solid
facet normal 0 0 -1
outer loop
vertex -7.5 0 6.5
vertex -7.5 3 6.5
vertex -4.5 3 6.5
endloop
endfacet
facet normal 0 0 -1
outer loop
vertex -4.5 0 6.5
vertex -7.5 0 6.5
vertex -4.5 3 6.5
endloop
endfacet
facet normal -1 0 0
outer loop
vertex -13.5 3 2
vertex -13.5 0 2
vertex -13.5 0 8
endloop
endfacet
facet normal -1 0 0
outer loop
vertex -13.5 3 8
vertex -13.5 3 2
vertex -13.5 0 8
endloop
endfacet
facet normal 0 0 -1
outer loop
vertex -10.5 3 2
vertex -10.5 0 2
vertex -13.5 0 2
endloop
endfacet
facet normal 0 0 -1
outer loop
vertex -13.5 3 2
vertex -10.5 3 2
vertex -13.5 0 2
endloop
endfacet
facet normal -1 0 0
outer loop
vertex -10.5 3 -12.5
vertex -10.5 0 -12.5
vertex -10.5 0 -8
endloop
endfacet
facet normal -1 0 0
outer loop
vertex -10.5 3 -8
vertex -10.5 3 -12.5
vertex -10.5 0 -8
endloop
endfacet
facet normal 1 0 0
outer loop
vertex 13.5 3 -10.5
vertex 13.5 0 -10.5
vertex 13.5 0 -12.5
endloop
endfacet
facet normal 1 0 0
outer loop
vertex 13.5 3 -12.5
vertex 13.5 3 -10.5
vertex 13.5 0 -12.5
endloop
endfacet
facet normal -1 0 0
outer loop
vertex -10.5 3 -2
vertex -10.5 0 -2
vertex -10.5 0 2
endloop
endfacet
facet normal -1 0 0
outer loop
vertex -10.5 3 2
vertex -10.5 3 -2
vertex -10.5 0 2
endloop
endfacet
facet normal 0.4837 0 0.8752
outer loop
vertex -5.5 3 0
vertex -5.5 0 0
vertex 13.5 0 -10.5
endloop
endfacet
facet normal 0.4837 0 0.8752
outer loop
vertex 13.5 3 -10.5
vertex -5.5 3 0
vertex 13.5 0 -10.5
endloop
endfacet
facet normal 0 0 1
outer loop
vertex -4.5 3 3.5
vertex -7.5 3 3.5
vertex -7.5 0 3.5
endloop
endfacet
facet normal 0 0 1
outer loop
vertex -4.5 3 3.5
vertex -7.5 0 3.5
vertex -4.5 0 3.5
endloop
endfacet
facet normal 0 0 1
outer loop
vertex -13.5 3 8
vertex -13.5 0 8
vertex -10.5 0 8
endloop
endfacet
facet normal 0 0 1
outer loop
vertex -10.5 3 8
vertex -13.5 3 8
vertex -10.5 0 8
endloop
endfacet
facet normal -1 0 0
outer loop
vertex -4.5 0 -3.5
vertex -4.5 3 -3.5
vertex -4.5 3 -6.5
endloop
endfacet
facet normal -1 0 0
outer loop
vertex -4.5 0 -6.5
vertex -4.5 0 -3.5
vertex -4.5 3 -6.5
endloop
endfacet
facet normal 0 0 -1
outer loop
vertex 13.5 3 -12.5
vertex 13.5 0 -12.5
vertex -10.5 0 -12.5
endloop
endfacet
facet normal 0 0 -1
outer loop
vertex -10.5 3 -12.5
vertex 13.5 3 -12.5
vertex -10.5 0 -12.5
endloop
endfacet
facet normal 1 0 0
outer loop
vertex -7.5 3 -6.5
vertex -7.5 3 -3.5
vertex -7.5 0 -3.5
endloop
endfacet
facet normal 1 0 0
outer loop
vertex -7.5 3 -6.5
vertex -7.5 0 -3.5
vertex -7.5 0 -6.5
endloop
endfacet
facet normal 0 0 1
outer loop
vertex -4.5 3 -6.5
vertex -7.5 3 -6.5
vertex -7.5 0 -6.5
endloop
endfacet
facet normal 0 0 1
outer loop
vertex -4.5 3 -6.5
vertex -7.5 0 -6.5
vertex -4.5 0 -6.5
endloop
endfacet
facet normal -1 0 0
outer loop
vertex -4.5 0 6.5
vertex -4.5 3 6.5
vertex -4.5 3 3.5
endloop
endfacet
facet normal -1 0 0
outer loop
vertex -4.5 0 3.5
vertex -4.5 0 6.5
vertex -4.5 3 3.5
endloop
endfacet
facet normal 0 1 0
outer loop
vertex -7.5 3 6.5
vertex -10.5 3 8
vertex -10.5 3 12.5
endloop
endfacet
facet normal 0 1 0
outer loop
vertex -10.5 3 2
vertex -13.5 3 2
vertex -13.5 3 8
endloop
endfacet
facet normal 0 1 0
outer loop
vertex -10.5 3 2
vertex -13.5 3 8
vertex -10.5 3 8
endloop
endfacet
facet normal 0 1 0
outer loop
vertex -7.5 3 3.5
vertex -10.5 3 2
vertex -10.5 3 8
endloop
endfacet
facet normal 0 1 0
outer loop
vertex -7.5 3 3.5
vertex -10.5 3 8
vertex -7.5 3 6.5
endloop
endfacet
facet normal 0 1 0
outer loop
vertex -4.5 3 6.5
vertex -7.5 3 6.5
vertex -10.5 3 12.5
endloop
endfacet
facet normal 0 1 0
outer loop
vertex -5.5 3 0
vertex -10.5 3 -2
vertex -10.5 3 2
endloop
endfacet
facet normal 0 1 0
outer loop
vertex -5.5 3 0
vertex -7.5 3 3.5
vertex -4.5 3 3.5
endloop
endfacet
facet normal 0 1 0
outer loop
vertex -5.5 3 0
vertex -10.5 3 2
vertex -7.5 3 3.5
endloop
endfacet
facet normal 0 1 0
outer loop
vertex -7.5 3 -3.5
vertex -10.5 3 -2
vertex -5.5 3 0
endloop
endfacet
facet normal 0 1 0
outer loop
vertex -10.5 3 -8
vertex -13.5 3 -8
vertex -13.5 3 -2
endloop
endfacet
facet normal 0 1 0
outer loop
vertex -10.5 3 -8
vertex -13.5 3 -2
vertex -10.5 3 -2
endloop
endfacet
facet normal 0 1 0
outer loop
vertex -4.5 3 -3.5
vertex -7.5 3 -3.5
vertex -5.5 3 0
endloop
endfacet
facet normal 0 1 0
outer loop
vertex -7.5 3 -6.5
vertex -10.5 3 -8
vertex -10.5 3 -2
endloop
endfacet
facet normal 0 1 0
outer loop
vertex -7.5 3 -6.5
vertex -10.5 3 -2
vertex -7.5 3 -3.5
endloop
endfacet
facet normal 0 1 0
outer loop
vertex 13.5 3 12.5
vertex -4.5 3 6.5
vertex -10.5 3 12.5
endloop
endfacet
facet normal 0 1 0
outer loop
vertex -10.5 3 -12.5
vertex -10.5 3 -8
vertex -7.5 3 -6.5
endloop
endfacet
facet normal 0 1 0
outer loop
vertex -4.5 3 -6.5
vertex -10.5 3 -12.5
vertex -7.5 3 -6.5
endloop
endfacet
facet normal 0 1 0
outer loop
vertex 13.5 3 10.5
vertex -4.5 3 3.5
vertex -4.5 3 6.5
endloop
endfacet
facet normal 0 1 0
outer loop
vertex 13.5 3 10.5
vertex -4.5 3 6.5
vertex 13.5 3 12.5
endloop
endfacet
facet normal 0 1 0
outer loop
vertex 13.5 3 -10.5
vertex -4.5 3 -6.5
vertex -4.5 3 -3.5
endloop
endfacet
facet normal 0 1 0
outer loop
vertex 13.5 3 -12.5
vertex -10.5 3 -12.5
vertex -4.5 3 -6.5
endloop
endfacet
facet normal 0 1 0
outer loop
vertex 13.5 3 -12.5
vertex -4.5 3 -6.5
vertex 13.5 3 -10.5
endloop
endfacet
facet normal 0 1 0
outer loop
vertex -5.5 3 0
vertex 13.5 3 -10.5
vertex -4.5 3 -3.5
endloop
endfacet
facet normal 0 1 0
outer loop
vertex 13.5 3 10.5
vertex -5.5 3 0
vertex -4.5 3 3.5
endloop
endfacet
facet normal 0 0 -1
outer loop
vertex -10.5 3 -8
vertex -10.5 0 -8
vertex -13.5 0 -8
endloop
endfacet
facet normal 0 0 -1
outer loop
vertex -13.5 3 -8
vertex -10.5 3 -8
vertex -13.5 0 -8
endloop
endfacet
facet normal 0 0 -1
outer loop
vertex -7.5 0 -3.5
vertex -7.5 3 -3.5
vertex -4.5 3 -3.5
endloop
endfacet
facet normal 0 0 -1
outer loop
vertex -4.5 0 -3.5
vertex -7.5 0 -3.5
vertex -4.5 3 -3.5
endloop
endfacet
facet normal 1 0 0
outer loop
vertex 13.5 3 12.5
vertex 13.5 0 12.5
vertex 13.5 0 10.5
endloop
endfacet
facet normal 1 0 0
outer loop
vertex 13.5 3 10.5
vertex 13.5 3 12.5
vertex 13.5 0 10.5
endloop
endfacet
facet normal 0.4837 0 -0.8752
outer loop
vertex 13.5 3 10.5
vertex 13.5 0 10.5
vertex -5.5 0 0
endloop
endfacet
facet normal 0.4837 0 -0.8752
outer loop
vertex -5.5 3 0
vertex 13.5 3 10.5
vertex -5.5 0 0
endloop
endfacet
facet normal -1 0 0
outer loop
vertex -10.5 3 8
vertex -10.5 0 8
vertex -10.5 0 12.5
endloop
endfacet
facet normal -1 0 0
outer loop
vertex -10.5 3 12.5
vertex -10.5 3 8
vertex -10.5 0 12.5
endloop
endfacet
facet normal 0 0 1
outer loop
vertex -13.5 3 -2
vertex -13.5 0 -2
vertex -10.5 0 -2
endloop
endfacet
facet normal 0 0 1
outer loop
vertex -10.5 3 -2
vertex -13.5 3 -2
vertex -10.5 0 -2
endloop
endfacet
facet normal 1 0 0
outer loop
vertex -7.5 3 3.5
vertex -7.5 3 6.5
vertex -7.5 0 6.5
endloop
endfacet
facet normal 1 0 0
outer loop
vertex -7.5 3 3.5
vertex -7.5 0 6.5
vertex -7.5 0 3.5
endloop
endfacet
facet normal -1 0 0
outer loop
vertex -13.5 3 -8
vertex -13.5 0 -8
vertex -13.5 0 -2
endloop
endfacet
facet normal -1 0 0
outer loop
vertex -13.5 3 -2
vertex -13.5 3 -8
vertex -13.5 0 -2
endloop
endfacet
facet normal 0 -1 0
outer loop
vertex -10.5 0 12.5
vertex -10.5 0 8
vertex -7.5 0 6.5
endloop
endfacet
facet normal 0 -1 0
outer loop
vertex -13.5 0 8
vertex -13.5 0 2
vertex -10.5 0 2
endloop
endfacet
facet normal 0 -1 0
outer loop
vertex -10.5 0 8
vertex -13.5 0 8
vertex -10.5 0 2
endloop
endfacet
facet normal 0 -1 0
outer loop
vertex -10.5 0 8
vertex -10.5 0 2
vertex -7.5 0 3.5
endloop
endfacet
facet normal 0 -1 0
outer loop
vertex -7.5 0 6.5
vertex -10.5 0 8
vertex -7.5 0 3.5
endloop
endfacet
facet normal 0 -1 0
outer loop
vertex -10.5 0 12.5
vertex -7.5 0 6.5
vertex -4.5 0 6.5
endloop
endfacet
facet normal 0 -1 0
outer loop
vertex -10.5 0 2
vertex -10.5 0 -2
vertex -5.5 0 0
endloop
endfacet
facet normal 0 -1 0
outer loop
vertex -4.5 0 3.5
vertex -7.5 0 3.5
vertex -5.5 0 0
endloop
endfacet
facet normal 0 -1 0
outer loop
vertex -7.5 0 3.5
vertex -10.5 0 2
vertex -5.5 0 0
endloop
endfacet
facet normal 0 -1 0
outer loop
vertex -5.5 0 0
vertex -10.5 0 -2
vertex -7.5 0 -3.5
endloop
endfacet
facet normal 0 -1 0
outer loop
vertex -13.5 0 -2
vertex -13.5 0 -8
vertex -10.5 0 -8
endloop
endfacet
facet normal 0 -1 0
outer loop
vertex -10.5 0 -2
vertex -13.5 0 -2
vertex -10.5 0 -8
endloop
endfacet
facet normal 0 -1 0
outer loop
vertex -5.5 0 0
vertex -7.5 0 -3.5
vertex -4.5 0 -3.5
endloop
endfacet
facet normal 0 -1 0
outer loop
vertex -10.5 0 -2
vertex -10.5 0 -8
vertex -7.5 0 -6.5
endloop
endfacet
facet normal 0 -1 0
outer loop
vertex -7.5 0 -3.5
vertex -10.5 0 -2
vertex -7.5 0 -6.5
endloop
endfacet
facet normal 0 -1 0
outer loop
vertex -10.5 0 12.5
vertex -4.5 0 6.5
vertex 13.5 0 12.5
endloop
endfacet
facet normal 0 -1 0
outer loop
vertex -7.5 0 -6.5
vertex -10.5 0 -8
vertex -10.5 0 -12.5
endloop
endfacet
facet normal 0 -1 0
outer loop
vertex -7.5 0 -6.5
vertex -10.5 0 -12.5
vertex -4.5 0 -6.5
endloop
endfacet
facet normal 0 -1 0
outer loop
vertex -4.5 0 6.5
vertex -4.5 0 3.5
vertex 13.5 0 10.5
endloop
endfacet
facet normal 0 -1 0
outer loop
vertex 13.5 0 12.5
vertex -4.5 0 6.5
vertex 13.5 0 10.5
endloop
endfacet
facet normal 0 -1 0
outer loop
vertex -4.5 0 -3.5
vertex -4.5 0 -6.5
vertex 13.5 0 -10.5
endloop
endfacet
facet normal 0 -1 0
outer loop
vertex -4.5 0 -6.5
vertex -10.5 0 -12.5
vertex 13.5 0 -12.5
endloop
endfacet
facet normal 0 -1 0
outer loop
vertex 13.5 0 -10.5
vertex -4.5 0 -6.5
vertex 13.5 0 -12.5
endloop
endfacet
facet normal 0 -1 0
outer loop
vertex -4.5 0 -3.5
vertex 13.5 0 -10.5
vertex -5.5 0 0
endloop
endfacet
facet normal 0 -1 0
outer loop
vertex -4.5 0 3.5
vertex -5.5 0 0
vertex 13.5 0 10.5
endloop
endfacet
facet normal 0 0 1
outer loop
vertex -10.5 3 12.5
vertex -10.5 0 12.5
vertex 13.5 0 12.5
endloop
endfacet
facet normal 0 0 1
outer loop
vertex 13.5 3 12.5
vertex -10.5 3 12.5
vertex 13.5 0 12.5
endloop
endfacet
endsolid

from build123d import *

# Parameters (mm, degrees)
BOSS_EXTRUDE1_DEPTH = 3
SKETCH2_W           = 3
SKETCH2_H           = 3
CUT_EXTRUDE1_DEPTH  = 3


with BuildPart() as part:
    # Sketch1 → Boss-Extrude1 (new body)
    with BuildSketch(Plane(origin=(0, 0, 0), x_dir=(1, 0, 0), z_dir=(0, 1, 0))):
        Polygon((-5.5, 0), (13.5, 10.5), (13.5, 12.5), (-10.5, 12.5), (-10.5, 8), (-13.5, 8), (-13.5, 2), (-10.5, 2), (-10.5, -2), (-13.5, -2), (-13.5, -8), (-10.5, -8), (-10.5, -12.5), (13.5, -12.5), (13.5, -10.5), align=None)
    extrude(amount=BOSS_EXTRUDE1_DEPTH)

    # Sketch2 → Cut-Extrude1 (cut)
    with BuildSketch(Plane(origin=(0, 3, 0), x_dir=(1, 0, 0), z_dir=(0, 1, 0))):
        with Locations((-6, 5)):
            Rectangle(SKETCH2_W, SKETCH2_H)
        with Locations((-6, -5)):
            Rectangle(SKETCH2_W, SKETCH2_H)
    extrude(amount=-CUT_EXTRUDE1_DEPTH, mode=Mode.SUBTRACT)


solid = part.part
